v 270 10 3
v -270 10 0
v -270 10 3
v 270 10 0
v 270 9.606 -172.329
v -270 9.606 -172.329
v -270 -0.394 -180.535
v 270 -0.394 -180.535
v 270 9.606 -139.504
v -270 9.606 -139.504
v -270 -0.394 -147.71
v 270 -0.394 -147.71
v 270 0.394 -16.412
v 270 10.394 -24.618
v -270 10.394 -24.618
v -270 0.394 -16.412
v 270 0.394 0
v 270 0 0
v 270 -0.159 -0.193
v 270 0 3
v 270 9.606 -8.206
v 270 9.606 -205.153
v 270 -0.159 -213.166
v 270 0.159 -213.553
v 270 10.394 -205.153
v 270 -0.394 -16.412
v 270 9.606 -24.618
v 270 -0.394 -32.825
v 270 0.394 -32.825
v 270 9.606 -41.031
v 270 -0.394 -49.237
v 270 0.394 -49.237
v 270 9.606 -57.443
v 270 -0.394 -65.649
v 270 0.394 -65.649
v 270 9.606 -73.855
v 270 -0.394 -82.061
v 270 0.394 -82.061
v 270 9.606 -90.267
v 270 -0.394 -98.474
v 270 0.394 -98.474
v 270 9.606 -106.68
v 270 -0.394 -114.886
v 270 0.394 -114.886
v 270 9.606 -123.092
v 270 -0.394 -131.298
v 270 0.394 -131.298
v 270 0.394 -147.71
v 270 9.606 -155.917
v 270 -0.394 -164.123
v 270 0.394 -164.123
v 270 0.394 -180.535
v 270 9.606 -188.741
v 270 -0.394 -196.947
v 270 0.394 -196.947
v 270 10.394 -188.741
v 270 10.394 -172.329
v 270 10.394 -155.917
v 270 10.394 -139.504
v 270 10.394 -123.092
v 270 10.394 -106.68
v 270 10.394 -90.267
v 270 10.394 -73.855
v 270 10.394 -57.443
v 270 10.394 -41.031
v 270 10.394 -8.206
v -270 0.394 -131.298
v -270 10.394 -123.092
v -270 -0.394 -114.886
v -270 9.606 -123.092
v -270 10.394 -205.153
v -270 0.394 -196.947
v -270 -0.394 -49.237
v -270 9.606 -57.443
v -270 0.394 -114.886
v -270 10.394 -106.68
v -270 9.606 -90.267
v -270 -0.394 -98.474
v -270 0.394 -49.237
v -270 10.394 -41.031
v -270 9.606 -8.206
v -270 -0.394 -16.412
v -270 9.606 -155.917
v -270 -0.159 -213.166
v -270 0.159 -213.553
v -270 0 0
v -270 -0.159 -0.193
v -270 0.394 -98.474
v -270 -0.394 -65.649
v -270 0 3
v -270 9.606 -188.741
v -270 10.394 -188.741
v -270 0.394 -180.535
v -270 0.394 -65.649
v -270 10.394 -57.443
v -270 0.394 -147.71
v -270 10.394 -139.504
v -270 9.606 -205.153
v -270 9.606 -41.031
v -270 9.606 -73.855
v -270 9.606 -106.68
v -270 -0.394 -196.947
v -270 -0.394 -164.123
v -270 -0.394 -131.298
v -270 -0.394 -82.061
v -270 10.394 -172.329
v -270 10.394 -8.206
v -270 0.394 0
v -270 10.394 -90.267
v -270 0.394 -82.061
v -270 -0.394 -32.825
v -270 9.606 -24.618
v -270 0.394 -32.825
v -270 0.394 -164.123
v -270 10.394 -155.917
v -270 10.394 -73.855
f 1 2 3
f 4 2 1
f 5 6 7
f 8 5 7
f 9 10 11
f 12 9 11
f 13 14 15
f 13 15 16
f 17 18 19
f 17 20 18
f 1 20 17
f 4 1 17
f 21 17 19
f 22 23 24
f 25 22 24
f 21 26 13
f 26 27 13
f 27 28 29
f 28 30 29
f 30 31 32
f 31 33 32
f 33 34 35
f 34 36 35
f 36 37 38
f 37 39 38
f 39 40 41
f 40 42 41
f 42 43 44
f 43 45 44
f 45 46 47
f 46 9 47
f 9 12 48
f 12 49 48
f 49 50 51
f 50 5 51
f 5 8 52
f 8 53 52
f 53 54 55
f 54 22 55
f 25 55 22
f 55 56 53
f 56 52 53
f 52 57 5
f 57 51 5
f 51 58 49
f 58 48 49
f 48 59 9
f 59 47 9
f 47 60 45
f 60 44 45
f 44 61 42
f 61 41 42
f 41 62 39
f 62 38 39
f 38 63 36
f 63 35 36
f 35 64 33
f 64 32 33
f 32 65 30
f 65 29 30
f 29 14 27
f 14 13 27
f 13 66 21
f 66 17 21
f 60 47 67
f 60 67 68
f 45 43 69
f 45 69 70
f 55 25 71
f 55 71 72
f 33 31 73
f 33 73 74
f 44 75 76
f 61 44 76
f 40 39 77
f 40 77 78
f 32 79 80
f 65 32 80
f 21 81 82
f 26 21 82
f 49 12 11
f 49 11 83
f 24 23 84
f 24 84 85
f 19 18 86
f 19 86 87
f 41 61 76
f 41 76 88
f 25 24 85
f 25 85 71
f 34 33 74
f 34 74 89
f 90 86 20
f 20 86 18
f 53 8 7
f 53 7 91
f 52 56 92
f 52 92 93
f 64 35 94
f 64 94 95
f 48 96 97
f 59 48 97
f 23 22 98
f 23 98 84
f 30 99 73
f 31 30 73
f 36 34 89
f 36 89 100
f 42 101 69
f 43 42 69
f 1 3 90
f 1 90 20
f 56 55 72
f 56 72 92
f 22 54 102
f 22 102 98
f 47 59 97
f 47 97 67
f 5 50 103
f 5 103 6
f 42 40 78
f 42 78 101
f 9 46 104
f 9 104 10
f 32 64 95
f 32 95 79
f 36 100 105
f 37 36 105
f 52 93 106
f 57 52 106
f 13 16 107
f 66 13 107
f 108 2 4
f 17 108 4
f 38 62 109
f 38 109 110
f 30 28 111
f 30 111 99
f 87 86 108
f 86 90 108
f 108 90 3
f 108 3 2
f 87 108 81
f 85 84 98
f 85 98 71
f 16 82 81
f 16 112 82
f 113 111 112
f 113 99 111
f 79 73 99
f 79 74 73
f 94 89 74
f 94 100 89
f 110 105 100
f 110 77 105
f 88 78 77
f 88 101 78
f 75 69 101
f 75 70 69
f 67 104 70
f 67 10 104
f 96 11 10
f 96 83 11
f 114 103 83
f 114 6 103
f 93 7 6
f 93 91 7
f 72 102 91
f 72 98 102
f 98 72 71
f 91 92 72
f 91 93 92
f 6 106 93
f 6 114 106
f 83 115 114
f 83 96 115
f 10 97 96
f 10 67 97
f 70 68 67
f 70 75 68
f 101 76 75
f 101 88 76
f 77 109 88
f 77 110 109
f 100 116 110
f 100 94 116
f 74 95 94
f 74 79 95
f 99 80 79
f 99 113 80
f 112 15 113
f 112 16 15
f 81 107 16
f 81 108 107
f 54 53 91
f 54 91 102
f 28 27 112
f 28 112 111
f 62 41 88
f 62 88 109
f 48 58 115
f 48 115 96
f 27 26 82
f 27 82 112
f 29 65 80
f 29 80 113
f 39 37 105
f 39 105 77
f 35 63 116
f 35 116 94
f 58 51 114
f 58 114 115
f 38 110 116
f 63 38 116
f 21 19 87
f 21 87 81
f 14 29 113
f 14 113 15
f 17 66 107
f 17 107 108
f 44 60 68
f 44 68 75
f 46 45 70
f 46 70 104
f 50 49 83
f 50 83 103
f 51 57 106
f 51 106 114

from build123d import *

# Parameters (mm, degrees)
SKETCH2_W           = 540
SKETCH2_H           = 10
BOSS_EXTRUDE1_DEPTH = 3
EXTRUDE_THIN1_DEPTH = 540


with BuildPart() as part:
    # Sketch2 → Boss-Extrude1 (new body)
    with BuildSketch(Plane.XY):
        with Locations((0, 5)):
            Rectangle(SKETCH2_W, SKETCH2_H)
    extrude(amount=BOSS_EXTRUDE1_DEPTH)

    # Sketch3 → Extrude-Thin1 (add, through all)
    with BuildSketch(Plane(origin=(270, 0, 0), x_dir=(0, 0, -1), z_dir=(1, 0, 0))):
        Polygon((0.193258825, -0.158590751), (8.206132428, 9.605903879), (16.412264855, -0.394096121), (24.618397283, 9.605903879), (32.824529711, -0.394096121), (41.030662139, 9.605903879), (49.236794566, -0.394096121), (57.442926994, 9.605903879), (65.649059422, -0.394096121), (73.85519185, 9.605903879), (82.061324277, -0.394096121), (90.267456705, 9.605903879), (98.473589133, -0.394096121), (106.679721561, 9.605903879), (114.885853988, -0.394096121), (123.091986416, 9.605903879), (131.298118844, -0.394096121), (139.504251272, 9.605903879), (147.710383699, -0.394096121), (155.916516127, 9.605903879), (164.122648555, -0.394096121), (172.328780983, 9.605903879), (180.53491341, -0.394096121), (188.741045838, 9.605903879), (196.947178266, -0.394096121), (205.153310694, 9.605903879), (213.166184296, -0.158590751), (213.552701947, 0.158590751), (205.153310694, 10.394096121), (196.947178266, 0.394096121), (188.741045838, 10.394096121), (180.53491341, 0.394096121), (172.328780983, 10.394096121), (164.122648555, 0.394096121), (155.916516127, 10.394096121), (147.710383699, 0.394096121), (139.504251272, 10.394096121), (131.298118844, 0.394096121), (123.091986416, 10.394096121), (114.885853988, 0.394096121), (106.679721561, 10.394096121), (98.473589133, 0.394096121), (90.267456705, 10.394096121), (82.061324277, 0.394096121), (73.85519185, 10.394096121), (65.649059422, 0.394096121), (57.442926994, 10.394096121), (49.236794566, 0.394096121), (41.030662139, 10.394096121), (32.824529711, 0.394096121), (24.618397283, 10.394096121), (16.412264855, 0.394096121), (8.206132428, 10.394096121), (-0.193258825, 0.158590751), align=None)
    extrude(amount=-EXTRUDE_THIN1_DEPTH)


solid = part.part
